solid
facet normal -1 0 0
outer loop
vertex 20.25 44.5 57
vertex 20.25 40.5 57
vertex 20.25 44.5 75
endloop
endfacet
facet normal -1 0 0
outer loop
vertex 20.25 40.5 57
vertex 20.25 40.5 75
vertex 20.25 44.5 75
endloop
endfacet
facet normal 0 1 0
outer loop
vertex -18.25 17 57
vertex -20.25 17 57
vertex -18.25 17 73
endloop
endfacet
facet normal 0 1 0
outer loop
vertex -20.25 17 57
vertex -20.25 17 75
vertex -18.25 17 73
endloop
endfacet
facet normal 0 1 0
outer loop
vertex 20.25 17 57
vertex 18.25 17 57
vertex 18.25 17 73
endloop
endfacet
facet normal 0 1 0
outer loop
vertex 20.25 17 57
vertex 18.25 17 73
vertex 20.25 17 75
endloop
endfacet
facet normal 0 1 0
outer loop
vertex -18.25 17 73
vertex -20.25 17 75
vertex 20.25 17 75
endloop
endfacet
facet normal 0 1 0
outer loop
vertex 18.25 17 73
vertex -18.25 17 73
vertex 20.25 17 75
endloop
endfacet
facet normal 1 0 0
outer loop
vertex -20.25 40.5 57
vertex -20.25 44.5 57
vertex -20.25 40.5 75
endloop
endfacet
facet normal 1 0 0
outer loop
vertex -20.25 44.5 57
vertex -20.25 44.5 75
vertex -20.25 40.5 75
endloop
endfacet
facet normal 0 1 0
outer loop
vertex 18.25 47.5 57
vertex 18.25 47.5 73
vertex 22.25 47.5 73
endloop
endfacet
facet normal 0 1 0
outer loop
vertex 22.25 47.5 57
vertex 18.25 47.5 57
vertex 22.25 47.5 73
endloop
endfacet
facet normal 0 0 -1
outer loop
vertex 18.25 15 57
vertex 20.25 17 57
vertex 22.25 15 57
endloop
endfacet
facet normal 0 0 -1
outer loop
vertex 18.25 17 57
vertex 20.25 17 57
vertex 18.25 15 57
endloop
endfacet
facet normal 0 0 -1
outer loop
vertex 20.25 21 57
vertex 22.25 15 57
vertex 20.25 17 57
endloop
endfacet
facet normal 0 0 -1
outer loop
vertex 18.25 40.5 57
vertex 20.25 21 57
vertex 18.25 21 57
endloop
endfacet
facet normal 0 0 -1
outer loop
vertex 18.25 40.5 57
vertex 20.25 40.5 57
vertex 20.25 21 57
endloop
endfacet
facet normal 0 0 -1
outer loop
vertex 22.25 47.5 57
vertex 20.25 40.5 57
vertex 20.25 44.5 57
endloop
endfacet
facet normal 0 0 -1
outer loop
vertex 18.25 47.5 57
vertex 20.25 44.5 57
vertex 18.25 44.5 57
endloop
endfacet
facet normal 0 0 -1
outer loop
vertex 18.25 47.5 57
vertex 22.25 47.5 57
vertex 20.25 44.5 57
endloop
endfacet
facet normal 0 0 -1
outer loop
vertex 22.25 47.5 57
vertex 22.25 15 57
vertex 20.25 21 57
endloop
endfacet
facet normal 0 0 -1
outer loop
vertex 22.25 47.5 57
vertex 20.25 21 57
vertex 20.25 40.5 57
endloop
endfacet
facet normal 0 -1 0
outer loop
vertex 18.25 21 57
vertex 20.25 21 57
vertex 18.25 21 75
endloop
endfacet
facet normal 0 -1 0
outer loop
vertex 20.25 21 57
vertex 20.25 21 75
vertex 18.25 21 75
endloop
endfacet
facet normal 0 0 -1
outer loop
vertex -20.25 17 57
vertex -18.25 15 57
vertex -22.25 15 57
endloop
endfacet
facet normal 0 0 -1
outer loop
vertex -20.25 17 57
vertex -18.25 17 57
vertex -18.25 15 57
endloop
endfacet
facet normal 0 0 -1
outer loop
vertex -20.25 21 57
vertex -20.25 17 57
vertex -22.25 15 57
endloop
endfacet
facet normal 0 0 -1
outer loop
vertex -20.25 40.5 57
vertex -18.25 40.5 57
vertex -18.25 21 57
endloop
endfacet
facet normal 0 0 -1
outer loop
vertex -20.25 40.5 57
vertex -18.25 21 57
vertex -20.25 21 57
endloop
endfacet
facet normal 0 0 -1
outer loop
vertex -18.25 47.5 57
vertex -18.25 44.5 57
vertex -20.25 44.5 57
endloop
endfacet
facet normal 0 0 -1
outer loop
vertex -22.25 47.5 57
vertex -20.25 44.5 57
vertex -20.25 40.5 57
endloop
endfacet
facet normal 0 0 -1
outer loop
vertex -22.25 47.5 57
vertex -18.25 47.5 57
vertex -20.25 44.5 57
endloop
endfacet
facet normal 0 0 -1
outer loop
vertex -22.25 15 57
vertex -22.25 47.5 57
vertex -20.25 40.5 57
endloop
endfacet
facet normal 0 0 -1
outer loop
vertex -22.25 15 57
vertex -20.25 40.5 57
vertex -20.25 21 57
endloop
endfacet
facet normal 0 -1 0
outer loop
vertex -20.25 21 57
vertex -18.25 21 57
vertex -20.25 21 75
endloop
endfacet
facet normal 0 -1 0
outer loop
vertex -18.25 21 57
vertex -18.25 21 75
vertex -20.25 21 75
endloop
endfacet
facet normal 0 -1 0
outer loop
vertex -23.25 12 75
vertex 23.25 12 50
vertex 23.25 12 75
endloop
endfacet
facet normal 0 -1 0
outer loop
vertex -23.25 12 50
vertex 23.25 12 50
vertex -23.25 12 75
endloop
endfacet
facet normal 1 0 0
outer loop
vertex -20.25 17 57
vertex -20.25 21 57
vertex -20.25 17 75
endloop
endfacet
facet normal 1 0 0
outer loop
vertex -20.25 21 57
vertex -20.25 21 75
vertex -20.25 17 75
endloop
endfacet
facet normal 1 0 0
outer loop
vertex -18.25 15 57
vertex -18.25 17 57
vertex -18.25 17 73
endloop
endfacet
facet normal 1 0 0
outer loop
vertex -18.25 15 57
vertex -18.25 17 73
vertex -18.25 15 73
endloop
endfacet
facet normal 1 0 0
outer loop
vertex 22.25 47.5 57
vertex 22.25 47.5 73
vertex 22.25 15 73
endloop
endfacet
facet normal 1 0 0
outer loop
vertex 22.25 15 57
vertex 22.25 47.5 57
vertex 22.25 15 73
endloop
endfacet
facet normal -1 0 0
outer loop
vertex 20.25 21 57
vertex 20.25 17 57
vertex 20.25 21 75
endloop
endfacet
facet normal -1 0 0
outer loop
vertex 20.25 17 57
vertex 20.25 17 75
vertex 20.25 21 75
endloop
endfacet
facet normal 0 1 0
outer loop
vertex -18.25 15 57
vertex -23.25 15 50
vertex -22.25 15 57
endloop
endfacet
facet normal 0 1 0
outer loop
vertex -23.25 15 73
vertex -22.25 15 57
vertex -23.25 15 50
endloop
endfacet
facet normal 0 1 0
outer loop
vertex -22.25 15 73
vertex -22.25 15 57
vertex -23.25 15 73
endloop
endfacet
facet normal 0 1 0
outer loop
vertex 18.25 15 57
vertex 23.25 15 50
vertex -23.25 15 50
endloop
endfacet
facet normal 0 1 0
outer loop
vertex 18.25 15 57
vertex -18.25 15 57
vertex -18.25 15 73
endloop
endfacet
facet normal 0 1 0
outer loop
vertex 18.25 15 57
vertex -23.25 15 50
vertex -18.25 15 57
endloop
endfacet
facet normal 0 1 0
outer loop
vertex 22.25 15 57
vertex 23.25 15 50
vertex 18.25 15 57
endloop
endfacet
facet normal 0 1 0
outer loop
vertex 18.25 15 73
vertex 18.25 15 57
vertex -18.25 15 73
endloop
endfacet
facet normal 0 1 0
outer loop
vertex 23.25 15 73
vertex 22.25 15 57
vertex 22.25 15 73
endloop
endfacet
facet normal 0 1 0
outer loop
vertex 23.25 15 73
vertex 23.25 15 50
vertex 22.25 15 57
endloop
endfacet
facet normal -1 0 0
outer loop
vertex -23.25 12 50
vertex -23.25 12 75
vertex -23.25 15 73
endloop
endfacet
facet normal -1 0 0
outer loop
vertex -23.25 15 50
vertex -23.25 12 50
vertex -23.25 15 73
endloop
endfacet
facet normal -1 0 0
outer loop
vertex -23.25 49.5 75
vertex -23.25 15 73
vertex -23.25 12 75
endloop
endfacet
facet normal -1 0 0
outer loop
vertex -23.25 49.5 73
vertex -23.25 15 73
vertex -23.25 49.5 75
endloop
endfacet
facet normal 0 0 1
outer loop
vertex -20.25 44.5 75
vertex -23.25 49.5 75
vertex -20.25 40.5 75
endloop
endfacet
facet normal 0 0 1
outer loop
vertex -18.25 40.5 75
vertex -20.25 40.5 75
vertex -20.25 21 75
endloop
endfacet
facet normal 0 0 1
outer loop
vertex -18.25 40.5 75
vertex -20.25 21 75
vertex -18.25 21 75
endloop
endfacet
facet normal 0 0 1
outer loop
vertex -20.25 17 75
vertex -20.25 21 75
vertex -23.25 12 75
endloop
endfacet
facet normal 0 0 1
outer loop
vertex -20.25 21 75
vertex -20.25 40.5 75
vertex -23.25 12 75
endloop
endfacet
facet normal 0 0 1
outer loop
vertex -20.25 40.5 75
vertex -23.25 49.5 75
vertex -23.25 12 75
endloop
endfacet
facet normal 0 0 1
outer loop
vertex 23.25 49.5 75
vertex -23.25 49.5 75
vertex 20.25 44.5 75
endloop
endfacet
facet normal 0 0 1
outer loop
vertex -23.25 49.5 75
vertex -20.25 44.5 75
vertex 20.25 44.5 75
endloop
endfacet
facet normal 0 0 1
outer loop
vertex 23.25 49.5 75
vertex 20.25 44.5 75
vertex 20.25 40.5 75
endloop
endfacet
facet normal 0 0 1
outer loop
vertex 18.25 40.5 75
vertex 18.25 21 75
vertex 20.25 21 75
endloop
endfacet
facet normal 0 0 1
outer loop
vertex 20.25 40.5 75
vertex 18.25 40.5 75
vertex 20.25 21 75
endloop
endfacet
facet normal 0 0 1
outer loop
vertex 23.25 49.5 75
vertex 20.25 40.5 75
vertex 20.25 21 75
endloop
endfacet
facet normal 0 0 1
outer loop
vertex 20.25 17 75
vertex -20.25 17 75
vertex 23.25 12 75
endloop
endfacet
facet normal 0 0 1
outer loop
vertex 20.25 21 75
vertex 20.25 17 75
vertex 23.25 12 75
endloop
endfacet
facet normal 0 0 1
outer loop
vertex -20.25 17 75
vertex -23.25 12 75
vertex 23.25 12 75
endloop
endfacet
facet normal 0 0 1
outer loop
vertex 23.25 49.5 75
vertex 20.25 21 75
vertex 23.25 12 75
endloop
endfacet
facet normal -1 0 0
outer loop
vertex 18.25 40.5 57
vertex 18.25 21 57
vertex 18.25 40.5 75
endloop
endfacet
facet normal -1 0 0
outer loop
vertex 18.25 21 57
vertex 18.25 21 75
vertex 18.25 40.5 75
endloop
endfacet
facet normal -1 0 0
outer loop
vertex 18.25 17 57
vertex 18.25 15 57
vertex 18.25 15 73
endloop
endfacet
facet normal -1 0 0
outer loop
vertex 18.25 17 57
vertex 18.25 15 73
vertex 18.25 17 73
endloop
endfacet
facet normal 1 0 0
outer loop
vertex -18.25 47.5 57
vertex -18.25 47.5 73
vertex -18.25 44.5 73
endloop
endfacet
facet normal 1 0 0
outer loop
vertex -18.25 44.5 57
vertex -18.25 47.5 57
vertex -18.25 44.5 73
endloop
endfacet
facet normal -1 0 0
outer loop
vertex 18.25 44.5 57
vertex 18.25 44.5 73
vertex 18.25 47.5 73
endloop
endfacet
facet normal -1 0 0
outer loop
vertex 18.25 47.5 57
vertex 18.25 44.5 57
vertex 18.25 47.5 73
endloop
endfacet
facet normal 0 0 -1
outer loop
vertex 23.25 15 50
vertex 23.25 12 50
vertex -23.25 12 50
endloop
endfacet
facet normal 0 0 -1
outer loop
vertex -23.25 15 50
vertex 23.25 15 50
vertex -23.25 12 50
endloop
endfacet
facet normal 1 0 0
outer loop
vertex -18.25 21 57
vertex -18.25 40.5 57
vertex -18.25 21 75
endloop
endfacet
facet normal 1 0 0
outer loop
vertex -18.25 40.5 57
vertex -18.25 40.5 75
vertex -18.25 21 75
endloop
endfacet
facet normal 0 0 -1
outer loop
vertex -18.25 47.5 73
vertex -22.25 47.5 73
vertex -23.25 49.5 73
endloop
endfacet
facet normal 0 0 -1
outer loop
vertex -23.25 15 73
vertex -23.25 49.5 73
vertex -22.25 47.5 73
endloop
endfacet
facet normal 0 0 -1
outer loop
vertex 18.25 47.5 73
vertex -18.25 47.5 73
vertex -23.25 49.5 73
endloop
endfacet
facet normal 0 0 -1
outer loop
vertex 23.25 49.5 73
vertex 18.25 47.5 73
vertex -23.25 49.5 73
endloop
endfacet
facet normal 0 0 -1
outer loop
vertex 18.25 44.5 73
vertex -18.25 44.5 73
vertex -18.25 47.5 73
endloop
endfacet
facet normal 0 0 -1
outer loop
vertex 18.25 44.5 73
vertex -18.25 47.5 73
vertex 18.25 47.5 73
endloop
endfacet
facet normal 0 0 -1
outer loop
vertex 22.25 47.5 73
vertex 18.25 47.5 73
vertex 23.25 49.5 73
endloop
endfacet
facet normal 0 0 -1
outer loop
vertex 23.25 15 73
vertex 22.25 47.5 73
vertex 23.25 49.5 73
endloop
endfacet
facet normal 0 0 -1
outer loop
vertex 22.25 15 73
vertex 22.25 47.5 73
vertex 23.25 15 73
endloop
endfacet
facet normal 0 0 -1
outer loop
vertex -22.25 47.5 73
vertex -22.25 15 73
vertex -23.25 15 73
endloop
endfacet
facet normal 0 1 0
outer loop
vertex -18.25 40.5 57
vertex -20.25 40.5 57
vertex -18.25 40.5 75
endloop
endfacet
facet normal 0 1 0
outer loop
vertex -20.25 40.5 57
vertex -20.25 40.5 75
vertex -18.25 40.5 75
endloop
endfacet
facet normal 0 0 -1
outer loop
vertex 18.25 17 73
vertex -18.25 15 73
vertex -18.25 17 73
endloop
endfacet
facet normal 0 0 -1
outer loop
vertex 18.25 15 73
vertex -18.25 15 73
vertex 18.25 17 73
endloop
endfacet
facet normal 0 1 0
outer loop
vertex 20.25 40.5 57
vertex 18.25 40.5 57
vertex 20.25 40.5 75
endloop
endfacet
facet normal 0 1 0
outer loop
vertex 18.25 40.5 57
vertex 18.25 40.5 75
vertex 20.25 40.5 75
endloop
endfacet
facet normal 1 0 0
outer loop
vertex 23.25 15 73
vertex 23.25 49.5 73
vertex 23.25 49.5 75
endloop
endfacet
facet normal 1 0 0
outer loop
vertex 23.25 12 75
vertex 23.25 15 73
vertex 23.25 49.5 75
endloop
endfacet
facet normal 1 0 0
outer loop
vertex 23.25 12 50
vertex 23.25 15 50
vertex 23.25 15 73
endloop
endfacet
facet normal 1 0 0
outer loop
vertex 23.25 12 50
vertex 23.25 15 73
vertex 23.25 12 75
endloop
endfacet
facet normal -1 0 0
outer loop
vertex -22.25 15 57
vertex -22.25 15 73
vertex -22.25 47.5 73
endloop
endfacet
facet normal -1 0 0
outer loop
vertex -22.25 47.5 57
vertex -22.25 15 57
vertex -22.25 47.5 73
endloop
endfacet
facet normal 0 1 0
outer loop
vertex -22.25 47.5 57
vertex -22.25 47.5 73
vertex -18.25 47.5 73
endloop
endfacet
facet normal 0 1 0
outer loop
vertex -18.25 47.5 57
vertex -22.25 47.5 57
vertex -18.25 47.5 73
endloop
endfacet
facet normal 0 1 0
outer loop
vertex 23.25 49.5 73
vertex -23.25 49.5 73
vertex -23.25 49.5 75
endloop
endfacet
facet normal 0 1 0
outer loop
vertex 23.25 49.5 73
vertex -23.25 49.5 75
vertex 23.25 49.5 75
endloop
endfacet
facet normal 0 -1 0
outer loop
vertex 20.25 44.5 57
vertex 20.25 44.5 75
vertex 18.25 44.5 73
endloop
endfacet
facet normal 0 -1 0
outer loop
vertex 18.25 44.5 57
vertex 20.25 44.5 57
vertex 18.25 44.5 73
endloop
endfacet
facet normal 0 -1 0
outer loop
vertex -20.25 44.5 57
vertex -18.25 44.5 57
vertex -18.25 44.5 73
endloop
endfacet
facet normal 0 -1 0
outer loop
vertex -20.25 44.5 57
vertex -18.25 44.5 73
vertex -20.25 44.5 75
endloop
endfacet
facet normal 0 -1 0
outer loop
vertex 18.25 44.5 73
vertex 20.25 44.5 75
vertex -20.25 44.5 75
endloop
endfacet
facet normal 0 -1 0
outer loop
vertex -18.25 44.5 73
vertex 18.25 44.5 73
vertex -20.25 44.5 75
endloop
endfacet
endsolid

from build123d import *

# Parameters (mm, degrees)
SKETCH2_W                = 200
SKETCH2_H                = 150
BOSS_EXTRUDE1_DEPTH      = 80
FILLET1_R                = 10
SHELL1_T                 = -2
SHELL1_THICKNESS_2_DEPTH = 13
SKETCH5_W                = 2
SKETCH5_H                = 4
CUT_EXTRUDE1_DEPTH       = 2
BOSS_EXTRUDE2_DEPTH      = 16
SKETCH7_W                = 36.5
SKETCH7_H                = 27.5
CUT_EXTRUDE2_DEPTH       = 2
BOSS_EXTRUDE3_DEPTH      = 16
SKETCH10_W               = 36.5
SKETCH10_H               = 27.5
CUT_EXTRUDE4_DEPTH       = 2
BOSS_EXTRUDE4_DEPTH      = 16
SKETCH13_W               = 38
SKETCH13_H               = 19.1
CUT_EXTRUDE5_DEPTH       = 2
BOSS_EXTRUDE5_DEPTH      = 13.5
SKETCH15_W               = 10.5
SKETCH15_H               = 9.367949192
CUT_EXTRUDE6_DEPTH       = 3
CUT_EXTRUDE8_REACH       = 150.408
SKETCH20_R               = 8
SPLIT1_SURFACE_1_BACK    = 263.488
SPLIT1_SURFACE_1_DEPTH   = 526.976
SPLIT1_SURFACE_2_BACK    = 263.488
SPLIT1_SURFACE_2_DEPTH   = 526.976
SPLIT2_SURFACE_3_BACK    = 263.488
SPLIT2_SURFACE_3_DEPTH   = 526.976
SPLIT2_SURFACE_4_BACK    = 263.488
SPLIT2_SURFACE_4_DEPTH   = 526.976


with BuildPart() as part:
    # Sketch2 → Boss-Extrude1 (new body)
    with BuildSketch(Plane(origin=(0, 0, 0), x_dir=(1, 0, 0), z_dir=(0, 1, 0))):
        Rectangle(SKETCH2_W, SKETCH2_H)
    extrude(amount=BOSS_EXTRUDE1_DEPTH)

    # Fillet1
    fillet1_edges = [part.edges().sort_by_distance(p)[0] for p in [
        (100, 40, 75),
        (-100, 40, 75),
        (-100, 40, -75),
        (100, 40, -75),
    ]]
    fillet(fillet1_edges, radius=FILLET1_R)

    # Shell1
    shell1_openings = [part.faces().sort_by_distance(p)[0] for p in [
        (0, 80, 0),
    ]]
    offset(amount=SHELL1_T, openings=shell1_openings, kind=Kind.INTERSECTION)

    # Shell1 thickness 2 face (on inner face of the shell) → Shell1 thickness 2 (add)
    with BuildSketch(Plane(origin=(0, 2, 0), x_dir=(0, 0, -1), z_dir=(0, -1, 0))):
        with BuildLine():
            ThreePointArc((73, -90), (70.656854249, -95.656854249), (65, -98))
            Line((65, -98), (-65, -98))
            ThreePointArc((-65, -98), (-70.656854249, -95.656854249), (-73, -90))
            Line((-73, -90), (-73, 90))
            ThreePointArc((-73, 90), (-70.656854249, 95.656854249), (-65, 98))
            Line((-65, 98), (65, 98))
            ThreePointArc((65, 98), (70.656854249, 95.656854249), (73, 90))
            Line((73, 90), (73, -90))
        make_face()
    extrude(amount=-SHELL1_THICKNESS_2_DEPTH)

    # Sketch5 → Cut-Extrude1 (cut)
    with BuildSketch(Plane.XY.offset(75)):
        Polygon((18.25, 44.5), (-18.25, 44.5), (-18.25, 40.5), (-18.25, 21), (-18.25, 17), (18.25, 17), (18.25, 21), (18.25, 40.5), align=None)
        with Locations((-19.25, 42.5)):
            Rectangle(SKETCH5_W, SKETCH5_H)
        with Locations((19.25, 42.5)):
            Rectangle(SKETCH5_W, SKETCH5_H)
        with Locations((-19.25, 19)):
            Rectangle(SKETCH5_W, SKETCH5_H)
        with Locations((19.25, 19)):
            Rectangle(SKETCH5_W, SKETCH5_H)
    extrude(amount=-CUT_EXTRUDE1_DEPTH, mode=Mode.SUBTRACT)

    # Sketch6 → Boss-Extrude2 (add)
    with BuildSketch(Plane(origin=(0, 0, 73), x_dir=(-1, 0, 0), z_dir=(0, 0, -1))):
        Polygon((18.25, 15), (22.25, 15), (22.25, 47.5), (18.25, 47.5), (18.25, 44.5), (20.25, 44.5), (20.25, 40.5), (18.25, 40.5), (18.25, 21), (20.25, 21), (20.25, 17), (18.25, 17), align=None)
        Polygon((-22.25, 47.5), (-22.25, 15), (-18.25, 15), (-18.25, 17), (-20.25, 17), (-20.25, 21), (-18.25, 21), (-18.25, 40.5), (-20.25, 40.5), (-20.25, 44.5), (-18.25, 44.5), (-18.25, 47.5), align=None)
    extrude(amount=BOSS_EXTRUDE2_DEPTH)

    # Sketch7 → Cut-Extrude2 (cut)
    with BuildSketch(Plane(origin=(100, 0, 0), x_dir=(0, 0, -1), z_dir=(1, 0, 0))):
        with Locations((0, 30.75)):
            Rectangle(SKETCH7_W, SKETCH7_H)
        Polygon((-18.25, 43.5), (-19.75, 44.366025404), (-19.75, 41.633974596), (-18.25, 42.5), align=None)
        Polygon((-19.75, 19.866025404), (-18.25, 19), (-18.25, 18), (-19.75, 17.133974596), align=None)
        Polygon((19.75, 17.133974596), (19.75, 19.866025404), (18.25, 19), (18.25, 18), align=None)
        Polygon((19.75, 41.633974596), (18.25, 42.5), (18.25, 43.5), (19.75, 44.366025404), align=None)
    extrude(amount=-CUT_EXTRUDE2_DEPTH, mode=Mode.SUBTRACT)

    # Sketch8 → Boss-Extrude3 (add)
    with BuildSketch(Plane.ZY.offset(-98)):
        Polygon((-21.25, 47.5), (-18.25, 47.5), (-18.25, 43.5), (-19.75, 44.366025404), (-19.75, 41.633974596), (-18.25, 42.5), (-18.25, 19), (-19.75, 19.866025404), (-19.75, 17.133974596), (-18.25, 18), (-18.25, 15), (-21.25, 15), align=None)
        Polygon((19.75, 44.366025404), (18.25, 43.5), (18.25, 47.5), (21.25, 47.5), (21.25, 15), (18.25, 15), (18.25, 18), (19.75, 17.133974596), (19.75, 19.866025404), (18.25, 19), (18.25, 42.5), (19.75, 41.633974596), align=None)
    extrude(amount=BOSS_EXTRUDE3_DEPTH)

    # Sketch10 → Cut-Extrude4 (cut)
    with BuildSketch(Plane.ZY.offset(100)):
        with Locations((0, 30.75)):
            Rectangle(SKETCH10_W, SKETCH10_H)
        Polygon((-18.25, 43.5), (-19.75, 44.366025404), (-19.75, 41.633974596), (-18.25, 42.5), align=None)
        Polygon((-19.75, 19.866025404), (-18.25, 19), (-18.25, 18), (-19.75, 17.133974596), align=None)
        Polygon((19.75, 17.133974596), (19.75, 19.866025404), (18.25, 19), (18.25, 18), align=None)
        Polygon((19.75, 41.633974596), (18.25, 42.5), (18.25, 43.5), (19.75, 44.366025404), align=None)
    extrude(amount=-CUT_EXTRUDE4_DEPTH, mode=Mode.SUBTRACT)

    # Sketch11 → Boss-Extrude4 (add)
    with BuildSketch(Plane(origin=(-98, 0, 0), x_dir=(0, 0, -1), z_dir=(1, 0, 0))):
        Polygon((-18.25, 47.5), (-21.25, 47.5), (-21.25, 15), (-18.25, 15), (-18.25, 18), (-19.75, 17.133974596), (-19.75, 19.866025404), (-18.25, 19), (-18.25, 42.5), (-19.75, 41.633974596), (-19.75, 44.366025404), (-18.25, 43.5), align=None)
        Polygon((19.75, 44.366025404), (18.25, 43.5), (18.25, 47.5), (21.25, 47.5), (21.25, 15), (18.25, 15), (18.25, 18), (19.75, 17.133974596), (19.75, 19.866025404), (18.25, 19), (18.25, 42.5), (19.75, 41.633974596), align=None)
    extrude(amount=BOSS_EXTRUDE4_DEPTH)

    # Sketch13 → Cut-Extrude5 (cut)
    with BuildSketch(Plane.XY.offset(75)):
        Polygon((41, 39.3), (39.5, 40.166025404), (39.5, 37.433974596), (41, 38.3), align=None)
        with Locations((60, 30.75)):
            Rectangle(SKETCH13_W, SKETCH13_H)
        Polygon((41, 22.2), (39.5, 21.333974596), (39.5, 24.066025404), (41, 23.2), align=None)
        Polygon((79, 22.2), (79, 23.2), (80.5, 24.066025404), (80.5, 21.333974596), align=None)
        Polygon((79, 39.3), (80.5, 40.166025404), (80.5, 37.433974596), (79, 38.3), align=None)
    extrude(amount=-CUT_EXTRUDE5_DEPTH, mode=Mode.SUBTRACT)

    # Sketch14 → Boss-Extrude5 (add)
    with BuildSketch(Plane(origin=(0, 0, 73), x_dir=(-1, 0, 0), z_dir=(0, 0, -1))):
        Polygon((-79, 43.3), (-82, 43.3), (-82, 15), (-79, 15), (-79, 22.2), (-80.5, 21.333974596), (-80.5, 24.066025404), (-79, 23.2), (-79, 38.3), (-80.5, 37.433974596), (-80.5, 40.166025404), (-79, 39.3), align=None)
        Polygon((-39.5, 40.166025404), (-41, 39.3), (-41, 43.3), (-38, 43.3), (-38, 15), (-41, 15), (-41, 22.2), (-39.5, 21.333974596), (-39.5, 24.066025404), (-41, 23.2), (-41, 38.3), (-39.5, 37.433974596), align=None)
    extrude(amount=BOSS_EXTRUDE5_DEPTH)

    # Sketch15 → Cut-Extrude6 (cut)
    with BuildSketch(Plane.ZY.offset(-38)):
        with Locations((66.75, 30.75)):
            Rectangle(SKETCH15_W, SKETCH15_H)
    extrude(amount=-CUT_EXTRUDE6_DEPTH, mode=Mode.SUBTRACT)

    # Sketch18 → Cut-Revolve1 (revolve, cut)
    with BuildSketch(Plane(origin=(0, 0, 0), x_dir=(0, 0, -1), z_dir=(1, 0, 0)), mode=Mode.PRIVATE) as cut_revolve1_sk:
        Polygon((-42.5, 0), (-70, 0), (-47.5, 10), (-42.5, 10), align=None)
    revolve(cut_revolve1_sk.sketch.rotate(Axis((0, 0, 0), (0, 1, 0)), 180), axis=Axis((0, 0, 0), (0, 1, 0)), mode=Mode.SUBTRACT)

    # Cut-Extrude8: up to this face of the body (flat: up to its plane)
    cut_extrude8_end = Plane(part.part.faces().sort_by_distance((-0.172584848, 15, -0.486016332))[0])
    # Sketch20 → Cut-Extrude8 (cut, up to the picked face)
    with BuildSketch(Plane.XZ, mode=Mode.PRIVATE) as cut_extrude8_sk1:
        with Locations(Location((0, -42.5, 0), (0, 0, 270))):
            Circle(SKETCH20_R)
    cut_extrude8_tool1 = split(extrude(cut_extrude8_sk1.sketch, amount=-CUT_EXTRUDE8_REACH, mode=Mode.PRIVATE), bisect_by=cut_extrude8_end, keep=Keep.BOTH, mode=Mode.PRIVATE)
    add(cut_extrude8_tool1.solids().sort_by(Axis((0, 0, -42.5), (0, 1, 0)))[0], mode=Mode.SUBTRACT)


with BuildPart() as body_2:
    # Split1: the piece behind the surface
    add(part.part)
    # Split1 surface: a surface, the sketch's curves swept straight by 526.976 mm
    with BuildLine(Plane.XY.offset(75).offset(-SPLIT1_SURFACE_1_BACK), mode=Mode.PRIVATE) as split1_surface_1_path:
        Line((-23.25, 49.5), (23.25, 49.5))
        Line((23.25, 49.5), (23.25, 12))
        Line((23.25, 12), (-23.25, 12))
        Line((-23.25, 12), (-23.25, 49.5))
    split1_surface_1 = Shell.extrude(split1_surface_1_path.wire(), (0 * SPLIT1_SURFACE_1_DEPTH, 0 * SPLIT1_SURFACE_1_DEPTH, 1 * SPLIT1_SURFACE_1_DEPTH))
    split(bisect_by=split1_surface_1, keep=Keep.BOTTOM)


with BuildPart() as part_1:
    add(part.part)

    # Split1: split by a surface, the side it looks to stays
    # Split1 surface: a surface, the sketch's curves swept straight by 526.976 mm
    with BuildLine(Plane.XY.offset(75).offset(-SPLIT1_SURFACE_2_BACK), mode=Mode.PRIVATE) as split1_surface_2_path:
        Line((-23.25, 49.5), (23.25, 49.5))
        Line((23.25, 49.5), (23.25, 12))
        Line((23.25, 12), (-23.25, 12))
        Line((-23.25, 12), (-23.25, 49.5))
    split1_surface_2 = Shell.extrude(split1_surface_2_path.wire(), (0 * SPLIT1_SURFACE_2_DEPTH, 0 * SPLIT1_SURFACE_2_DEPTH, 1 * SPLIT1_SURFACE_2_DEPTH))
    split(bisect_by=split1_surface_2, keep=Keep.TOP)


with BuildPart() as body_3:
    # Split2: the piece behind the surface
    add(body_2.part)
    # Split2 surface: a surface, the sketch's curves swept straight by 526.976 mm
    with BuildLine(Plane(origin=(0, 15, 0), x_dir=(1, 0, 0), z_dir=(0, 1, 0)).offset(-SPLIT2_SURFACE_3_BACK), mode=Mode.PRIVATE) as split2_surface_3_path:
        Line((-23.25, -75), (23.25, -75))
        Line((23.25, -75), (23.25, -50))
        Line((23.25, -50), (-23.25, -50))
        Line((-23.25, -50), (-23.25, -75))
    split2_surface_3 = Shell.extrude(split2_surface_3_path.wire(), (0 * SPLIT2_SURFACE_3_DEPTH, 1 * SPLIT2_SURFACE_3_DEPTH, 0 * SPLIT2_SURFACE_3_DEPTH))
    split(bisect_by=split2_surface_3, keep=Keep.BOTTOM)


with BuildPart() as body_2_1:
    add(body_2.part)

    # Split2: split by a surface, the side it looks to stays
    # Split2 surface: a surface, the sketch's curves swept straight by 526.976 mm
    with BuildLine(Plane(origin=(0, 15, 0), x_dir=(1, 0, 0), z_dir=(0, 1, 0)).offset(-SPLIT2_SURFACE_4_BACK), mode=Mode.PRIVATE) as split2_surface_4_path:
        Line((-23.25, -75), (23.25, -75))
        Line((23.25, -75), (23.25, -50))
        Line((23.25, -50), (-23.25, -50))
        Line((-23.25, -50), (-23.25, -75))
    split2_surface_4 = Shell.extrude(split2_surface_4_path.wire(), (0 * SPLIT2_SURFACE_4_DEPTH, 1 * SPLIT2_SURFACE_4_DEPTH, 0 * SPLIT2_SURFACE_4_DEPTH))
    split(bisect_by=split2_surface_4, keep=Keep.TOP)


solid = body_2_1.part
